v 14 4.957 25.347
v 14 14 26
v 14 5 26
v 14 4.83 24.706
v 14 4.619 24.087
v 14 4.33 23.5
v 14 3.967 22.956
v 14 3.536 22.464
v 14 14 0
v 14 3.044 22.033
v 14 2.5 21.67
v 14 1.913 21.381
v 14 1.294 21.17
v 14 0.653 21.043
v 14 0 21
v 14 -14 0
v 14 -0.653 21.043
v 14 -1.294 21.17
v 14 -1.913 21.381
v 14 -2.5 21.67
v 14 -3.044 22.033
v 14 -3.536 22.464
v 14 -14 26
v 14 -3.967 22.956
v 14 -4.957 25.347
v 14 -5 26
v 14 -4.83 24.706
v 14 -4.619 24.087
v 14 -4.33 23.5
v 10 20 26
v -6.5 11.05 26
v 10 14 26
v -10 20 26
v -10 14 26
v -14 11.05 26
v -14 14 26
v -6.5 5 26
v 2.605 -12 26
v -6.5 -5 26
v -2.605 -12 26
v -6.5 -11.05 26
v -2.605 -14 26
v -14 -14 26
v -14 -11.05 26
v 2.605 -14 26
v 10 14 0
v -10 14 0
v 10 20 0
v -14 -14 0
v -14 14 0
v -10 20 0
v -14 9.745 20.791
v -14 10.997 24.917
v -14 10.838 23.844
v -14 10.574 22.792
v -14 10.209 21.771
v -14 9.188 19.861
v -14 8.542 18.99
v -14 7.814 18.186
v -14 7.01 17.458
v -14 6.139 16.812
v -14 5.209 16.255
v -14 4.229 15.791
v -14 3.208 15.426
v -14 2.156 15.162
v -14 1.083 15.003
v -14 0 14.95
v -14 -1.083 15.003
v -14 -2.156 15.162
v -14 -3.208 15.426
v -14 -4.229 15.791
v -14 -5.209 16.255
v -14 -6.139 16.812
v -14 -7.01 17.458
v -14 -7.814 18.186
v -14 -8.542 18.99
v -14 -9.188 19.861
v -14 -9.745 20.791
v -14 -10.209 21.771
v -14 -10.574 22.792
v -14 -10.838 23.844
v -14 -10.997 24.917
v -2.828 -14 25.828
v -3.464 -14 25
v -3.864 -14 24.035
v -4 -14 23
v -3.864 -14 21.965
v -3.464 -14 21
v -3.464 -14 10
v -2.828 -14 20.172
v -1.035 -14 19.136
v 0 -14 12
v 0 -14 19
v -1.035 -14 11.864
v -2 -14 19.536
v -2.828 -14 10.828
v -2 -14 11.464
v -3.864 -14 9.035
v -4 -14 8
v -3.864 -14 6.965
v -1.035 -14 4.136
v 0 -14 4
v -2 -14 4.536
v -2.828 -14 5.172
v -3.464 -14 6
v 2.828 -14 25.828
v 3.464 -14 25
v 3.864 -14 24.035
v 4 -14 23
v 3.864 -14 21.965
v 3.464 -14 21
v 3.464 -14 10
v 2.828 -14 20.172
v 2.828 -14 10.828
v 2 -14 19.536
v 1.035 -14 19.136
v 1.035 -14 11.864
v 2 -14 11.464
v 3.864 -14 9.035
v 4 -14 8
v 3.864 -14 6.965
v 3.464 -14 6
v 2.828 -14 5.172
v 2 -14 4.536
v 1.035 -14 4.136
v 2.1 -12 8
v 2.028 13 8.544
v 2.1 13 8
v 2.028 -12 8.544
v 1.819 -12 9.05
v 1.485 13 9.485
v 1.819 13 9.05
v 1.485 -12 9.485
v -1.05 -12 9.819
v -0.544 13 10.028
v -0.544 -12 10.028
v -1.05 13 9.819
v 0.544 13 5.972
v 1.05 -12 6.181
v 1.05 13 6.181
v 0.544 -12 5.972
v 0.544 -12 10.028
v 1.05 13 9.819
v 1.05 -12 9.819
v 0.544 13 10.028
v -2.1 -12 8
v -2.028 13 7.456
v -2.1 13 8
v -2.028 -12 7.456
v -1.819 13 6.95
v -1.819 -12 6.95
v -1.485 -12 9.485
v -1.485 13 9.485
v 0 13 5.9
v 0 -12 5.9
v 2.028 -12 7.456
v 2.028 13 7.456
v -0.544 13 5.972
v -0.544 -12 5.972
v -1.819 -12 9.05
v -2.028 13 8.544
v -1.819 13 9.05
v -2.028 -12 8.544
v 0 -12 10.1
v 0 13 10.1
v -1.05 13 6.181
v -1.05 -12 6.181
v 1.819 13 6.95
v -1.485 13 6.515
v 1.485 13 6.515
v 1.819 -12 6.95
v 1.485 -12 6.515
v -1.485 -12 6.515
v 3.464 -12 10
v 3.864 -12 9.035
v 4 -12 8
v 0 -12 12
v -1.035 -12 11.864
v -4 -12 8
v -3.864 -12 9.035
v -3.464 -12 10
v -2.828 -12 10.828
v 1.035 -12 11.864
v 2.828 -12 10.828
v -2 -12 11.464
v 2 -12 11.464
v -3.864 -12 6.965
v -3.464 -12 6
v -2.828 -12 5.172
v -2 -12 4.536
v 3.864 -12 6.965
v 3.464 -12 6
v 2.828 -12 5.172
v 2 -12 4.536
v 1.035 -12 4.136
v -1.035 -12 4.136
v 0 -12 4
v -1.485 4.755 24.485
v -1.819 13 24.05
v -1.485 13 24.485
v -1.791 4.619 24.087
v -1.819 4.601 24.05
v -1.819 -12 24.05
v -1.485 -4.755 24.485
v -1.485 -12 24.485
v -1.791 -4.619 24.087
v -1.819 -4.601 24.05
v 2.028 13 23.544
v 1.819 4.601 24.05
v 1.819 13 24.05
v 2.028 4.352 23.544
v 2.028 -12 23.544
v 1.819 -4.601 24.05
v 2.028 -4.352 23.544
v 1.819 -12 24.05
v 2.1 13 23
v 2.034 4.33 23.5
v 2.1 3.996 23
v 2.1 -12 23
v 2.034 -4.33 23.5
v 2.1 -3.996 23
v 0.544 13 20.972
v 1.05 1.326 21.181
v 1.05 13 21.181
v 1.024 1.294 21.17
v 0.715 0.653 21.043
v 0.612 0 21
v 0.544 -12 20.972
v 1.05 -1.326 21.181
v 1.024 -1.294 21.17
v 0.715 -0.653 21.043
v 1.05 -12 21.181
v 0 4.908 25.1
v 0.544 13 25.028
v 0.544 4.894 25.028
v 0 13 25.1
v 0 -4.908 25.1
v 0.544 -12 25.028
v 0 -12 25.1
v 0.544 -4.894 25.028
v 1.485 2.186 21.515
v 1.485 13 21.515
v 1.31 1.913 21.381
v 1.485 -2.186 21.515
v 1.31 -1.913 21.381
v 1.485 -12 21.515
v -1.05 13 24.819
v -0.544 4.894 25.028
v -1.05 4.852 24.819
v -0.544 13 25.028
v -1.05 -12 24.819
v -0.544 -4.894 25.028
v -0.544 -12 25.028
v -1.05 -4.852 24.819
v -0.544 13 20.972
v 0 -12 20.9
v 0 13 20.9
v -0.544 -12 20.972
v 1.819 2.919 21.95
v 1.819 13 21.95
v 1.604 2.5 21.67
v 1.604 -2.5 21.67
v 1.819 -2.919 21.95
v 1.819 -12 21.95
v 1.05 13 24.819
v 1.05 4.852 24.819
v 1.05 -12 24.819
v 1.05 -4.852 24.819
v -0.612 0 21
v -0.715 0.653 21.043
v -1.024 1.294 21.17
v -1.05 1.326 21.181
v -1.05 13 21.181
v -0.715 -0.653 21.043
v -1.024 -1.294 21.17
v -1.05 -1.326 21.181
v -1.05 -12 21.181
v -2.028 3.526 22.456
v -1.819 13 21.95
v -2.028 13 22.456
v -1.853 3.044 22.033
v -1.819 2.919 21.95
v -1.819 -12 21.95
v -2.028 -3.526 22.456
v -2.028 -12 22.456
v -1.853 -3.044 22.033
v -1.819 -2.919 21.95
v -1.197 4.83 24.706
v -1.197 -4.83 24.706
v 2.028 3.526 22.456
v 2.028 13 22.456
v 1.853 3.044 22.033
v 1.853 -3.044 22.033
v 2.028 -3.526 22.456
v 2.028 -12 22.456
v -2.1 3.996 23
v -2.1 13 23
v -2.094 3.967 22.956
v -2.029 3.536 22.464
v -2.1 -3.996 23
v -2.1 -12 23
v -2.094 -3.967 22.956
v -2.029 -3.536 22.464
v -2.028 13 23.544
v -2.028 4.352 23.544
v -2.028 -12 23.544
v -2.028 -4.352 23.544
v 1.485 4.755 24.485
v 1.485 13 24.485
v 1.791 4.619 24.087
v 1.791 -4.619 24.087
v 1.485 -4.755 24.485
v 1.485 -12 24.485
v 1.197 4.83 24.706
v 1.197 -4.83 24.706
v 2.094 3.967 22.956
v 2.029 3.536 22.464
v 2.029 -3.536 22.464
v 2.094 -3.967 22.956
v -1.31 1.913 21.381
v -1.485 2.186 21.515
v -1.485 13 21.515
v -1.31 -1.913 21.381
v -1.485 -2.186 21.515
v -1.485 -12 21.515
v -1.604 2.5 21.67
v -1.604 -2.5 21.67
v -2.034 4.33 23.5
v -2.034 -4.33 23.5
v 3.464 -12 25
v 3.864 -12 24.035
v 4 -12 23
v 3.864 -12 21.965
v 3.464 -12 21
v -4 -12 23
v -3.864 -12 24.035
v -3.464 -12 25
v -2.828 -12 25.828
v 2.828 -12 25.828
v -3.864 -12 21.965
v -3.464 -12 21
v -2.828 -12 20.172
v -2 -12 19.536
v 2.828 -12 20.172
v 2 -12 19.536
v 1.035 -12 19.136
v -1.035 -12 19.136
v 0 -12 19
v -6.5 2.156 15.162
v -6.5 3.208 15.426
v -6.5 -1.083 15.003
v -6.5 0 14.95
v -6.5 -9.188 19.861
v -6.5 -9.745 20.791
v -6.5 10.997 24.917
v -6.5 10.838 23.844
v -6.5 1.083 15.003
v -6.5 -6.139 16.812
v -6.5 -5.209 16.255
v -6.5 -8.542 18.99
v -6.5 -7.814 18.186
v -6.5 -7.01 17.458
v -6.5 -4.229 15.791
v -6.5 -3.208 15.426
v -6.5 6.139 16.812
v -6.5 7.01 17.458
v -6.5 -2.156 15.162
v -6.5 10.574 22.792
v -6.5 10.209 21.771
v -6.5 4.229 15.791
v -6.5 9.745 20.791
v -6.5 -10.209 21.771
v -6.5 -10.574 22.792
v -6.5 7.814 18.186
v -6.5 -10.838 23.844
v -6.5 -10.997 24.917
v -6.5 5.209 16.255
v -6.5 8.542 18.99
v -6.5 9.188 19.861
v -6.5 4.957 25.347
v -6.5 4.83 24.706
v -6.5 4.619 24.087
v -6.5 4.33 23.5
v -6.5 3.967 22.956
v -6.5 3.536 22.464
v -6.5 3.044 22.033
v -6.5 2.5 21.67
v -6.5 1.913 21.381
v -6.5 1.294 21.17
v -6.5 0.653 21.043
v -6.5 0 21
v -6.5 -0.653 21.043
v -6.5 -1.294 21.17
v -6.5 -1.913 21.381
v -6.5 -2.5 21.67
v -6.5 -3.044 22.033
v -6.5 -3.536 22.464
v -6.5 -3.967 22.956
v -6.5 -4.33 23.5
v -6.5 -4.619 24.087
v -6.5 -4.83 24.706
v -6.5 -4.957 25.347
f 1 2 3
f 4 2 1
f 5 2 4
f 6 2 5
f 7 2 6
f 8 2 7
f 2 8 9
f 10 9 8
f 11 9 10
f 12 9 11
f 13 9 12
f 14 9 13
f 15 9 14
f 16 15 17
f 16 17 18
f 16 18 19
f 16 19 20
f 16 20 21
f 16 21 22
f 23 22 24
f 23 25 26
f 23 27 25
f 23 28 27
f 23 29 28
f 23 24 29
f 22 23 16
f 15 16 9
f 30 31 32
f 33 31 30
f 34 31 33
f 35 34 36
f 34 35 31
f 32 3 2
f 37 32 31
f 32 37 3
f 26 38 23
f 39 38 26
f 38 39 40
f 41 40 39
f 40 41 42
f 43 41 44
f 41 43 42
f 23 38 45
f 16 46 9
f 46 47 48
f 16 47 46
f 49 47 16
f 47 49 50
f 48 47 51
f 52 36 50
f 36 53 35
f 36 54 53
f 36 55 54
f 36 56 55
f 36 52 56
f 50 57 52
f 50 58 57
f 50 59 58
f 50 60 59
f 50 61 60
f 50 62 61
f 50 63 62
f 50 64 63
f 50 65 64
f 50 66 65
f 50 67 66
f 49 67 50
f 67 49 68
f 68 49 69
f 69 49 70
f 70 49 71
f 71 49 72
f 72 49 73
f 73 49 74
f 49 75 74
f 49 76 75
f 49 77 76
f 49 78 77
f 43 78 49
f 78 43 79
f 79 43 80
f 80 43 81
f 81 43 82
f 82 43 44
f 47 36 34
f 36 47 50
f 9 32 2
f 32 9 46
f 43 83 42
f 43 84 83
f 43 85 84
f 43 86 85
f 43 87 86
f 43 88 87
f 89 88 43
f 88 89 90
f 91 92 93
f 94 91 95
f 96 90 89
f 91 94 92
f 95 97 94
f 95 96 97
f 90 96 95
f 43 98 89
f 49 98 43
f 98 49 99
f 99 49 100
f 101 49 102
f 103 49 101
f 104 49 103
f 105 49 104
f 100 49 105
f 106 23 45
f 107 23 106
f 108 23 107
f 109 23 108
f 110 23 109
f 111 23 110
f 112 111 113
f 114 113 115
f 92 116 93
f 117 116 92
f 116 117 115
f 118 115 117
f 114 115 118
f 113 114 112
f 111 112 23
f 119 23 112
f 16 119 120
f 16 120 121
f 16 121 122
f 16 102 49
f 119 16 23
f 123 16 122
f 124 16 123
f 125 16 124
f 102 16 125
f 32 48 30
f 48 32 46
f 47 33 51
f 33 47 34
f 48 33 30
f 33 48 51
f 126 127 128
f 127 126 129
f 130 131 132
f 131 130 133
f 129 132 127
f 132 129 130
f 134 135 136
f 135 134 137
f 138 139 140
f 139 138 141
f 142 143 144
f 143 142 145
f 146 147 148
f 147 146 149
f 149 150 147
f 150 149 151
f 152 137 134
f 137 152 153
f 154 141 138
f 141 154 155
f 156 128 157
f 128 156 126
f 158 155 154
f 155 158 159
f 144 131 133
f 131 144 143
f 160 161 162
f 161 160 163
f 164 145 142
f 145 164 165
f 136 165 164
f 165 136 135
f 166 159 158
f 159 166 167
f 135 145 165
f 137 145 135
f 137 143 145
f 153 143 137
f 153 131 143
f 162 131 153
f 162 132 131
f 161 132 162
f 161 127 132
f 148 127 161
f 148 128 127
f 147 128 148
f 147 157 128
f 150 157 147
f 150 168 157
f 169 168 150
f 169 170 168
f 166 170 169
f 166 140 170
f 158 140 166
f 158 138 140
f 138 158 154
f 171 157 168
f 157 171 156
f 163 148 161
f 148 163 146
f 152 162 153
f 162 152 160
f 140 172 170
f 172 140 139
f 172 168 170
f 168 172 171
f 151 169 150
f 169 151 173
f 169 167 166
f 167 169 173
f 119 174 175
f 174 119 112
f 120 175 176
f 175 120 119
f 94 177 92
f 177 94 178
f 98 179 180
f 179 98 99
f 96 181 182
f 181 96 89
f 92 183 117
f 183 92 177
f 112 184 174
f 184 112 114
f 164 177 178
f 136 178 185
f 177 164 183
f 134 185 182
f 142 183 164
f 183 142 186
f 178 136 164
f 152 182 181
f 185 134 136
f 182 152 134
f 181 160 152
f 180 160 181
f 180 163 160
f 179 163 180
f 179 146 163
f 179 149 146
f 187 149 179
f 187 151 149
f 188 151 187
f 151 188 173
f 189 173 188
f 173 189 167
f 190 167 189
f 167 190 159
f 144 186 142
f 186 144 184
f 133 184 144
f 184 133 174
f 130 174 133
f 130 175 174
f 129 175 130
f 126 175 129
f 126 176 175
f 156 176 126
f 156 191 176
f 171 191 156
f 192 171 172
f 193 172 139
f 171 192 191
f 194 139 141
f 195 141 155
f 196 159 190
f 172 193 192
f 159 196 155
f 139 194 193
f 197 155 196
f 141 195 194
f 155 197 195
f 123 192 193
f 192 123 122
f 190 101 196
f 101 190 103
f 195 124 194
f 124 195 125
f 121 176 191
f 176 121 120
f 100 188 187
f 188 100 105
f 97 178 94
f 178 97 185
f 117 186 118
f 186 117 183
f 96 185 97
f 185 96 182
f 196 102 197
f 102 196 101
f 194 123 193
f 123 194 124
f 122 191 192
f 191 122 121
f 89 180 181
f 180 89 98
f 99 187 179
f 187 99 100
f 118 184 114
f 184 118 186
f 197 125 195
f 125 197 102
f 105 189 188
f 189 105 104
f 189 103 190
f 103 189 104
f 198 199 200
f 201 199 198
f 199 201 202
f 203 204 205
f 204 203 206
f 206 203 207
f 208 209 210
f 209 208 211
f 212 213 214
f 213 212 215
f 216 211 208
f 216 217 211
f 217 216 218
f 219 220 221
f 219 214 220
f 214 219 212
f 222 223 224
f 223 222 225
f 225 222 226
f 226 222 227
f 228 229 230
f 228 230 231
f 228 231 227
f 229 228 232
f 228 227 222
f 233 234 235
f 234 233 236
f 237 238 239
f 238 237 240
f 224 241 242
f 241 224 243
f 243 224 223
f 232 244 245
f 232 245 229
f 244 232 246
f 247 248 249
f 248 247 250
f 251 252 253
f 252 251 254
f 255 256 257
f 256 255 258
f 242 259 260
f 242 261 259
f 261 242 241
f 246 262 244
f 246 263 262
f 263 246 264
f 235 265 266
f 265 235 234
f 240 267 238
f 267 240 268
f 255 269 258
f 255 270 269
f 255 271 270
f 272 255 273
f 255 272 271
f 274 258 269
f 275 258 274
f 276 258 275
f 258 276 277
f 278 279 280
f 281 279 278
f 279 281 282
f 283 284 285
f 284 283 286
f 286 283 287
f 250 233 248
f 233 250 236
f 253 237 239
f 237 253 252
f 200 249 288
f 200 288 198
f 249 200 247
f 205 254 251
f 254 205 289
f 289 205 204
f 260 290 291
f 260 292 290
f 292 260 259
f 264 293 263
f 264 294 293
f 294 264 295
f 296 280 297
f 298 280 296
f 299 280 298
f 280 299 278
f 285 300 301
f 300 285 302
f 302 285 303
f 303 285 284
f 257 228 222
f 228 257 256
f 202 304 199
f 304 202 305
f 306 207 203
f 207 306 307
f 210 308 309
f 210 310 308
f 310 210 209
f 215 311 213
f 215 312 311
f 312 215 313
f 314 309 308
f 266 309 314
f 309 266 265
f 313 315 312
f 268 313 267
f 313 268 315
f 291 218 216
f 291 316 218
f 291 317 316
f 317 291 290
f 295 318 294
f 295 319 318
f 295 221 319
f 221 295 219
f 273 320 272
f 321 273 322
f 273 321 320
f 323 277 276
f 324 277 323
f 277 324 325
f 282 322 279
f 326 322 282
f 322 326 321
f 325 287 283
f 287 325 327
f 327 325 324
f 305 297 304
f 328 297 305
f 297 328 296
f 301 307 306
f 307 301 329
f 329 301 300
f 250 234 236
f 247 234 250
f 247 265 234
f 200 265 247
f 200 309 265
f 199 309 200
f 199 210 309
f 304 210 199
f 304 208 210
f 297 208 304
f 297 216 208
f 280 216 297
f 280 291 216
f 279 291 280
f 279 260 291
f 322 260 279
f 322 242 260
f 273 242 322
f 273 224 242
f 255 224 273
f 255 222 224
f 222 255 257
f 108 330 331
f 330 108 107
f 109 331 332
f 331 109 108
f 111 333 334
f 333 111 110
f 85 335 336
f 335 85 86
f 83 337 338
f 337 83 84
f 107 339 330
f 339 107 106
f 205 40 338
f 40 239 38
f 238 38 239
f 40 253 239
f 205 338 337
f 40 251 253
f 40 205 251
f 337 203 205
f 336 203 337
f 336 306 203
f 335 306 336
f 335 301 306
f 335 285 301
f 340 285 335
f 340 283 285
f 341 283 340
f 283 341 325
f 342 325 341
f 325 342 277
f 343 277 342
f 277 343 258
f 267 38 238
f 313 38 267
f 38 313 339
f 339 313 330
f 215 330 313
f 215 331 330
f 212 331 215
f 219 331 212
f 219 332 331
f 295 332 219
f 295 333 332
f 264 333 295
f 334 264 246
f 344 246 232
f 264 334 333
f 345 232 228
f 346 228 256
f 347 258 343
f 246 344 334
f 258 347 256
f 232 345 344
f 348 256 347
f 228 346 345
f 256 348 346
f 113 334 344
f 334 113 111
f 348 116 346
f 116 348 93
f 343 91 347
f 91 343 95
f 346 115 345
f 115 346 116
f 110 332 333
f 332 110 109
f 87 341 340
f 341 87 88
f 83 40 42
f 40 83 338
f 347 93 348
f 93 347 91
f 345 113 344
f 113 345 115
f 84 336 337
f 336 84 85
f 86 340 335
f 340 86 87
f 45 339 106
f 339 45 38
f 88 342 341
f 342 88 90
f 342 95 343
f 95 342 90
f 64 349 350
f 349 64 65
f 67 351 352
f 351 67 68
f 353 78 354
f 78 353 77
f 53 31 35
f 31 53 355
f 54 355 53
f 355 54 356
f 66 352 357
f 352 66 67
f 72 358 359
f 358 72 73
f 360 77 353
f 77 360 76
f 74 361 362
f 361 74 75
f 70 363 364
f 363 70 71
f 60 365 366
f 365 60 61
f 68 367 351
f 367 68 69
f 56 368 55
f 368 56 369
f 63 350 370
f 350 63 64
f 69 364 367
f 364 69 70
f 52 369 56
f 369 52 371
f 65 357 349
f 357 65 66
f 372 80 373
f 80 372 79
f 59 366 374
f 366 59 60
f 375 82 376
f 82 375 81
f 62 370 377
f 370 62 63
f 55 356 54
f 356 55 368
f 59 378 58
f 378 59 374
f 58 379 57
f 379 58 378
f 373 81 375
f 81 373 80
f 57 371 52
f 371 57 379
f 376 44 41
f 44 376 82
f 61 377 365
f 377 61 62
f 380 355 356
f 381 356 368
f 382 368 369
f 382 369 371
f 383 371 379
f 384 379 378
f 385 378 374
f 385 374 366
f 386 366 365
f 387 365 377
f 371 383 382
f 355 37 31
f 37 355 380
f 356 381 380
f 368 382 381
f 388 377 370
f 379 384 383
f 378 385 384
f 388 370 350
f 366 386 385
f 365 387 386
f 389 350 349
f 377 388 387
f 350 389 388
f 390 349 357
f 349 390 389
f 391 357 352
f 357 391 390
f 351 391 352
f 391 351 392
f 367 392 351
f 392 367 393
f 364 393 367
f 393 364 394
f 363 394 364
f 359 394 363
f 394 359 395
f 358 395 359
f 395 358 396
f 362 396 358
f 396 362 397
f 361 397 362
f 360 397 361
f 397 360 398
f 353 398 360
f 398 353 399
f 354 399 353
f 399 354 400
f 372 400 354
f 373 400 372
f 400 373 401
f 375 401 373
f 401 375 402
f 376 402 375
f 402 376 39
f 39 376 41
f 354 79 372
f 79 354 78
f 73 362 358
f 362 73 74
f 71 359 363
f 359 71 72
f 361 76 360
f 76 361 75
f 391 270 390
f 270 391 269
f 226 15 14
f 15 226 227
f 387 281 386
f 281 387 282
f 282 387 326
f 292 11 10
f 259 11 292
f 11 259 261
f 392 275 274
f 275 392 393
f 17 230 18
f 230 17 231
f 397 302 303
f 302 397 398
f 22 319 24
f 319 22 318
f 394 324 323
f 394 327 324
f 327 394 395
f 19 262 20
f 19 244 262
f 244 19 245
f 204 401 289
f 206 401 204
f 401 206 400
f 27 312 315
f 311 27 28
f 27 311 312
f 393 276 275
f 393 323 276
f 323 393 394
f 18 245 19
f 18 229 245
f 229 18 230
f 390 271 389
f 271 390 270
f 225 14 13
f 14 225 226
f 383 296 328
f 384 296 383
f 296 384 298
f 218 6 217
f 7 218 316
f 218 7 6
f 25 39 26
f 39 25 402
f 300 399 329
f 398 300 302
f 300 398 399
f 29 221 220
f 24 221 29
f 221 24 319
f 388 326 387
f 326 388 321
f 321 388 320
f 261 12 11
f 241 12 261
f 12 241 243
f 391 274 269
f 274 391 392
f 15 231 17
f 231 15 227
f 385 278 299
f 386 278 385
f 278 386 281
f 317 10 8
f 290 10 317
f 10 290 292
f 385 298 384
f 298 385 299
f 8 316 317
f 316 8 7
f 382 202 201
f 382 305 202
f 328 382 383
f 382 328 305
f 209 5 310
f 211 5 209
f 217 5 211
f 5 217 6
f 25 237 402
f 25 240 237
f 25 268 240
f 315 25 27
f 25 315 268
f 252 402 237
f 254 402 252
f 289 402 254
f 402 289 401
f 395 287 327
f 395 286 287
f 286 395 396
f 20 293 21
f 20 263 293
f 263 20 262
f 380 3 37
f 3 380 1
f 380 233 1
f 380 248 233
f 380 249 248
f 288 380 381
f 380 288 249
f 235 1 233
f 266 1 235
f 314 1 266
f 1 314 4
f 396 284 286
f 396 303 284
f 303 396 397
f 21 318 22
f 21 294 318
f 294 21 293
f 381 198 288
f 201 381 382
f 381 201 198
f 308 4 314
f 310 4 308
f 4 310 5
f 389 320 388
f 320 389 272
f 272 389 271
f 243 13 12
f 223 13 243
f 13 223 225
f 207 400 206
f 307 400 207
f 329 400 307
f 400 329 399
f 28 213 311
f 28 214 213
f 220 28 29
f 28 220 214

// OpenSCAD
// file: ../common.scad
/*
 * WAVE OCEAN V10 - VERTICAL SLAT SYSTEM V2
 * COMMON PARAMETERS
 *
 * DESIGN PRINCIPLES:
 * - TRUE TRAVELING WAVE (not synchronized bobbing)
 * - Maximum slats with minimum spacing
 * - 2 cam ridges = 2 visible waves traveling across
 * - Clean minimal slat design
 *
 * KEY INSIGHT:
 * For traveling wave: NUM_RIDGES << NUM_SLATS
 * Each slat experiences different phase of the wave
 *
 * All dimensions in mm
 */

// ============================================
// PRINT TOLERANCES (FDM tuned)
// ============================================

TOL_CLEARANCE = 0.2;         // Shaft in hole
TOL_SLIDING = 0.3;           // Slat in groove
TOL_PRESS_FIT = -0.1;        // Bearing press-fit

// ============================================
// HARDWARE SPECIFICATIONS
// ============================================

// 608 Bearing (main shaft)
BEARING_608_ID = 8;
BEARING_608_OD = 22;
BEARING_608_H = 7;

// Main shaft
SHAFT_DIA = 8;
SHAFT_HOLE = SHAFT_DIA + TOL_CLEARANCE;  // 8.2mm

// Fasteners
M3_HOLE = 3.2;
M3_HEAD_DIA = 5.5;
M3_HEAD_H = 3;
M4_HOLE = 4.2;
M4_HEAD_DIA = 7;

// ============================================
// SLAT CONFIGURATION - MAXIMIZED
// ============================================

// Slat dimensions (THIN for tight packing)
SLAT_THICKNESS = 2.5;                // X dimension - very thin
SLAT_DEPTH = 18;                     // Y dimension (front to back)

// Spacing calculation
// Minimum = thickness + clearance for movement
SLAT_CLEARANCE = 2.5;                // Gap between slats
SLAT_SPACING = SLAT_THICKNESS + SLAT_CLEARANCE;  // 5mm

// Cam and slat count
CAM_LENGTH = 180;                    // Active cam length
NUM_SLATS = floor(CAM_LENGTH / SLAT_SPACING);  // 36 slats!

// Height variations
SLAT_BASE_HEIGHT = 35;               // Minimum height
SLAT_HEIGHT_VARIATION = 12;          // Max additional height

// Height pattern: gradual variation for organic look
function slat_height(i) =
    SLAT_BASE_HEIGHT + SLAT_HEIGHT_VARIATION *
    (0.5 + 0.3 * sin(i * 45) + 0.2 * sin(i * 90));

// Back tab for groove guidance
TAB_THICKNESS = SLAT_THICKNESS;      // Same as slat
TAB_DEPTH = 10;                      // Into backplate
TAB_EXTRA_HEIGHT = 15;               // Below slat body

// Cam follower (curved bottom)
FOLLOWER_HEIGHT = 5;

// ============================================
// CAM CONFIGURATION - TRAVELING WAVE
// ============================================

// KEY: Few ridges = traveling wave effect
// 2 ridges = 2 complete waves visible at any time
NUM_RIDGES = 2;                      // Only 2 ridges!

CAM_CORE_RADIUS = 8;                 // Smaller core
CAM_RIDGE_HEIGHT = 10;               // Wave amplitude
CAM_MAX_RADIUS = CAM_CORE_RADIUS + CAM_RIDGE_HEIGHT;  // 18mm

// Helix: 2 turns over cam length = 2 ridges
HELIX_TURNS = NUM_RIDGES;            // 2 turns

// Follower curve matches cam
FOLLOWER_CURVE_RADIUS = CAM_CORE_RADIUS + 1;

// ============================================
// PHASE CALCULATION - THE KEY TO TRAVELING WAVE
// ============================================

// Slat X position (centered, evenly spaced)
function slat_x(i) = (i - (NUM_SLATS - 1) / 2) * SLAT_SPACING;

// Phase at slat position
// This determines WHERE on the wave cycle this slat is
function slat_phase(i, theta) =
    let(x = slat_x(i))
    // Helix angle based on position along cam
    let(helix_angle = ((x + CAM_LENGTH/2) / CAM_LENGTH) * 360 * HELIX_TURNS)
    // Add cam rotation
    helix_angle + theta;

// Cam surface height at slat position
// Uses cosine for smooth wave: 1 at peak, -1 at trough
function cam_surface_at_slat(i, theta) =
    let(phase = slat_phase(i, theta))
    CAM_CORE_RADIUS + CAM_RIDGE_HEIGHT * (0.5 + 0.5 * cos(phase));

// Slat Z position (bottom of slat rests on cam)
function slat_z(i, theta) =
    CAM_CENTER_Z + cam_surface_at_slat(i, theta);

// ============================================
// BACKPLATE CONFIGURATION
// ============================================

BACKPLATE_WIDTH = CAM_LENGTH + 30;   // 210mm
BACKPLATE_HEIGHT = 70;               // Enough for travel + slat height
BACKPLATE_THICKNESS = 12;            // Structural

// Groove dimensions
GROOVE_WIDTH = TAB_THICKNESS + TOL_SLIDING;  // 2.8mm
GROOVE_DEPTH = TAB_DEPTH + 2;                 // 12mm

// ============================================
// BEARING BLOCK CONFIGURATION
// ============================================

BB_WIDTH = 28;
BB_DEPTH = 28;
BB_HEIGHT = CAM_MAX_RADIUS + 8;      // 26mm

BEARING_POCKET_DIA = BEARING_608_OD - TOL_PRESS_FIT;  // 22.1mm
BEARING_POCKET_DEPTH = BEARING_608_H + 0.5;

// ============================================
// ASSEMBLY POSITIONS
// ============================================

// Cam center height (shaft axis)
CAM_CENTER_Z = BB_HEIGHT;            // 26mm above base

// Backplate position
BACKPLATE_Y = SLAT_DEPTH / 2 + 2;    // Behind slats
BACKPLATE_Z = 0;                     // Starts at base

// Bearing block X positions
BB_LEFT_X = -CAM_LENGTH / 2 - BB_WIDTH / 2 - 5;
BB_RIGHT_X = CAM_LENGTH / 2 + BB_WIDTH / 2 + 5;

// Shaft length
SHAFT_LENGTH = CAM_LENGTH + BB_WIDTH * 2 + 40;

// ============================================
// COLORS
// ============================================

C_SLAT = [0.15, 0.4, 0.7];           // Ocean blue
C_CAM = [0.65, 0.5, 0.3];            // Wood brown
C_BACKPLATE = [0.2, 0.18, 0.15];     // Dark wood
C_BB = [0.35, 0.35, 0.4];            // Gray
C_SHAFT = [0.6, 0.6, 0.65];          // Steel

// Slat color gradient (wave-like coloring)
function slat_color(i) =
    let(t = (sin(i * 360 / NUM_SLATS) + 1) / 2)  // 0 to 1 wave pattern
    [0.08 + 0.12*t, 0.25 + 0.2*t, 0.5 + 0.3*t];

// ============================================
// VERIFICATION
// ============================================

echo("============================================");
echo("  VERTICAL SLAT SYSTEM V2 - TRAVELING WAVE");
echo("============================================");
echo("");
echo("SLAT CONFIGURATION:");
echo(str("  Number of slats: ", NUM_SLATS));
echo(str("  Slat thickness: ", SLAT_THICKNESS, "mm"));
echo(str("  Slat spacing: ", SLAT_SPACING, "mm"));
echo(str("  Gap between slats: ", SLAT_CLEARANCE, "mm"));
echo("");
echo("CAM CONFIGURATION:");
echo(str("  Cam ridges: ", NUM_RIDGES, " (creates ", NUM_RIDGES, " traveling waves)"));
echo(str("  Slats per wave: ", NUM_SLATS / NUM_RIDGES));
echo(str("  Phase between adjacent slats: ", 360 * HELIX_TURNS / NUM_SLATS, "°"));
echo("");
echo("WAVE MOTION:");
echo(str("  Amplitude: ", CAM_RIDGE_HEIGHT, "mm"));
echo(str("  Core radius: ", CAM_CORE_RADIUS, "mm"));
echo("");
echo("This creates a TRUE traveling wave where adjacent");
echo("slats are at different phases of the wave cycle.");

// ============================================
// QUALITY SETTING
// ============================================

$fn = 48;
// main file
/*
 * BEARING BLOCK - 608 Bearing Mount
 *
 * Printable part: 2x (identical)
 * Print orientation: Upright
 *
 * DESIGN:
 * - 608 bearing pocket (press fit)
 * - Mounts to backplate flanges
 * - Compact size for smaller assembly
 */

include <../common.scad>

$fn = 48;

// ============================================
// MAIN BEARING BLOCK MODULE
// ============================================

module bearing_block() {
    difference() {
        union() {
            // Main block
            block_body();

            // Mounting tab
            mounting_tab();
        }

        // Bearing pocket
        bearing_pocket();

        // Shaft clearance
        shaft_clearance();

        // Mounting holes
        mounting_holes();
    }
}

// ============================================
// BLOCK BODY
// ============================================

module block_body() {
    translate([-BB_WIDTH/2, -BB_DEPTH/2, 0])
        cube([BB_WIDTH, BB_DEPTH, BB_HEIGHT]);
}

// ============================================
// MOUNTING TAB
// ============================================

module mounting_tab() {
    tab_width = BB_WIDTH - 8;
    tab_depth = 8;

    translate([-tab_width/2, BB_DEPTH/2 - 2, 0])
        cube([tab_width, tab_depth, BB_HEIGHT]);
}

// ============================================
// BEARING POCKET
// ============================================

module bearing_pocket() {
    // Press-fit pocket from outward side
    translate([-BB_WIDTH/2 - 1, 0, BB_HEIGHT])
    rotate([0, 90, 0])
        cylinder(d = BEARING_POCKET_DIA, h = BEARING_POCKET_DEPTH + 1, $fn = 64);
}

// ============================================
// SHAFT CLEARANCE
// ============================================

module shaft_clearance() {
    translate([0, 0, BB_HEIGHT])
    rotate([0, 90, 0])
        cylinder(d = BEARING_608_ID + 2, h = BB_WIDTH + 20, center = true);
}

// ============================================
// MOUNTING HOLES
// ============================================

module mounting_holes() {
    for (z = [8, BB_HEIGHT - 3]) {
        translate([0, BB_DEPTH/2 - 1, z])
        rotate([90, 0, 0])
            cylinder(d = M4_HOLE, h = BB_DEPTH + 12, $fn = 24);

        // Counterbore
        translate([0, -BB_DEPTH/2 + 2, z])
        rotate([90, 0, 0])
            cylinder(d = M4_HEAD_DIA + 1, h = 3, $fn = 24);
    }
}

// ============================================
// RENDER
// ============================================

color(C_BB)
bearing_block();

// Bearing ghost
%translate([-BB_WIDTH/2 + BEARING_POCKET_DEPTH/2, 0, BB_HEIGHT])
rotate([0, 90, 0])
    cylinder(d = BEARING_608_OD, h = BEARING_608_H, center = true);

echo("=== BEARING BLOCK ===");
echo(str("Size: ", BB_WIDTH, " x ", BB_DEPTH, " x ", BB_HEIGHT, "mm"));
echo("Print: 2x");
